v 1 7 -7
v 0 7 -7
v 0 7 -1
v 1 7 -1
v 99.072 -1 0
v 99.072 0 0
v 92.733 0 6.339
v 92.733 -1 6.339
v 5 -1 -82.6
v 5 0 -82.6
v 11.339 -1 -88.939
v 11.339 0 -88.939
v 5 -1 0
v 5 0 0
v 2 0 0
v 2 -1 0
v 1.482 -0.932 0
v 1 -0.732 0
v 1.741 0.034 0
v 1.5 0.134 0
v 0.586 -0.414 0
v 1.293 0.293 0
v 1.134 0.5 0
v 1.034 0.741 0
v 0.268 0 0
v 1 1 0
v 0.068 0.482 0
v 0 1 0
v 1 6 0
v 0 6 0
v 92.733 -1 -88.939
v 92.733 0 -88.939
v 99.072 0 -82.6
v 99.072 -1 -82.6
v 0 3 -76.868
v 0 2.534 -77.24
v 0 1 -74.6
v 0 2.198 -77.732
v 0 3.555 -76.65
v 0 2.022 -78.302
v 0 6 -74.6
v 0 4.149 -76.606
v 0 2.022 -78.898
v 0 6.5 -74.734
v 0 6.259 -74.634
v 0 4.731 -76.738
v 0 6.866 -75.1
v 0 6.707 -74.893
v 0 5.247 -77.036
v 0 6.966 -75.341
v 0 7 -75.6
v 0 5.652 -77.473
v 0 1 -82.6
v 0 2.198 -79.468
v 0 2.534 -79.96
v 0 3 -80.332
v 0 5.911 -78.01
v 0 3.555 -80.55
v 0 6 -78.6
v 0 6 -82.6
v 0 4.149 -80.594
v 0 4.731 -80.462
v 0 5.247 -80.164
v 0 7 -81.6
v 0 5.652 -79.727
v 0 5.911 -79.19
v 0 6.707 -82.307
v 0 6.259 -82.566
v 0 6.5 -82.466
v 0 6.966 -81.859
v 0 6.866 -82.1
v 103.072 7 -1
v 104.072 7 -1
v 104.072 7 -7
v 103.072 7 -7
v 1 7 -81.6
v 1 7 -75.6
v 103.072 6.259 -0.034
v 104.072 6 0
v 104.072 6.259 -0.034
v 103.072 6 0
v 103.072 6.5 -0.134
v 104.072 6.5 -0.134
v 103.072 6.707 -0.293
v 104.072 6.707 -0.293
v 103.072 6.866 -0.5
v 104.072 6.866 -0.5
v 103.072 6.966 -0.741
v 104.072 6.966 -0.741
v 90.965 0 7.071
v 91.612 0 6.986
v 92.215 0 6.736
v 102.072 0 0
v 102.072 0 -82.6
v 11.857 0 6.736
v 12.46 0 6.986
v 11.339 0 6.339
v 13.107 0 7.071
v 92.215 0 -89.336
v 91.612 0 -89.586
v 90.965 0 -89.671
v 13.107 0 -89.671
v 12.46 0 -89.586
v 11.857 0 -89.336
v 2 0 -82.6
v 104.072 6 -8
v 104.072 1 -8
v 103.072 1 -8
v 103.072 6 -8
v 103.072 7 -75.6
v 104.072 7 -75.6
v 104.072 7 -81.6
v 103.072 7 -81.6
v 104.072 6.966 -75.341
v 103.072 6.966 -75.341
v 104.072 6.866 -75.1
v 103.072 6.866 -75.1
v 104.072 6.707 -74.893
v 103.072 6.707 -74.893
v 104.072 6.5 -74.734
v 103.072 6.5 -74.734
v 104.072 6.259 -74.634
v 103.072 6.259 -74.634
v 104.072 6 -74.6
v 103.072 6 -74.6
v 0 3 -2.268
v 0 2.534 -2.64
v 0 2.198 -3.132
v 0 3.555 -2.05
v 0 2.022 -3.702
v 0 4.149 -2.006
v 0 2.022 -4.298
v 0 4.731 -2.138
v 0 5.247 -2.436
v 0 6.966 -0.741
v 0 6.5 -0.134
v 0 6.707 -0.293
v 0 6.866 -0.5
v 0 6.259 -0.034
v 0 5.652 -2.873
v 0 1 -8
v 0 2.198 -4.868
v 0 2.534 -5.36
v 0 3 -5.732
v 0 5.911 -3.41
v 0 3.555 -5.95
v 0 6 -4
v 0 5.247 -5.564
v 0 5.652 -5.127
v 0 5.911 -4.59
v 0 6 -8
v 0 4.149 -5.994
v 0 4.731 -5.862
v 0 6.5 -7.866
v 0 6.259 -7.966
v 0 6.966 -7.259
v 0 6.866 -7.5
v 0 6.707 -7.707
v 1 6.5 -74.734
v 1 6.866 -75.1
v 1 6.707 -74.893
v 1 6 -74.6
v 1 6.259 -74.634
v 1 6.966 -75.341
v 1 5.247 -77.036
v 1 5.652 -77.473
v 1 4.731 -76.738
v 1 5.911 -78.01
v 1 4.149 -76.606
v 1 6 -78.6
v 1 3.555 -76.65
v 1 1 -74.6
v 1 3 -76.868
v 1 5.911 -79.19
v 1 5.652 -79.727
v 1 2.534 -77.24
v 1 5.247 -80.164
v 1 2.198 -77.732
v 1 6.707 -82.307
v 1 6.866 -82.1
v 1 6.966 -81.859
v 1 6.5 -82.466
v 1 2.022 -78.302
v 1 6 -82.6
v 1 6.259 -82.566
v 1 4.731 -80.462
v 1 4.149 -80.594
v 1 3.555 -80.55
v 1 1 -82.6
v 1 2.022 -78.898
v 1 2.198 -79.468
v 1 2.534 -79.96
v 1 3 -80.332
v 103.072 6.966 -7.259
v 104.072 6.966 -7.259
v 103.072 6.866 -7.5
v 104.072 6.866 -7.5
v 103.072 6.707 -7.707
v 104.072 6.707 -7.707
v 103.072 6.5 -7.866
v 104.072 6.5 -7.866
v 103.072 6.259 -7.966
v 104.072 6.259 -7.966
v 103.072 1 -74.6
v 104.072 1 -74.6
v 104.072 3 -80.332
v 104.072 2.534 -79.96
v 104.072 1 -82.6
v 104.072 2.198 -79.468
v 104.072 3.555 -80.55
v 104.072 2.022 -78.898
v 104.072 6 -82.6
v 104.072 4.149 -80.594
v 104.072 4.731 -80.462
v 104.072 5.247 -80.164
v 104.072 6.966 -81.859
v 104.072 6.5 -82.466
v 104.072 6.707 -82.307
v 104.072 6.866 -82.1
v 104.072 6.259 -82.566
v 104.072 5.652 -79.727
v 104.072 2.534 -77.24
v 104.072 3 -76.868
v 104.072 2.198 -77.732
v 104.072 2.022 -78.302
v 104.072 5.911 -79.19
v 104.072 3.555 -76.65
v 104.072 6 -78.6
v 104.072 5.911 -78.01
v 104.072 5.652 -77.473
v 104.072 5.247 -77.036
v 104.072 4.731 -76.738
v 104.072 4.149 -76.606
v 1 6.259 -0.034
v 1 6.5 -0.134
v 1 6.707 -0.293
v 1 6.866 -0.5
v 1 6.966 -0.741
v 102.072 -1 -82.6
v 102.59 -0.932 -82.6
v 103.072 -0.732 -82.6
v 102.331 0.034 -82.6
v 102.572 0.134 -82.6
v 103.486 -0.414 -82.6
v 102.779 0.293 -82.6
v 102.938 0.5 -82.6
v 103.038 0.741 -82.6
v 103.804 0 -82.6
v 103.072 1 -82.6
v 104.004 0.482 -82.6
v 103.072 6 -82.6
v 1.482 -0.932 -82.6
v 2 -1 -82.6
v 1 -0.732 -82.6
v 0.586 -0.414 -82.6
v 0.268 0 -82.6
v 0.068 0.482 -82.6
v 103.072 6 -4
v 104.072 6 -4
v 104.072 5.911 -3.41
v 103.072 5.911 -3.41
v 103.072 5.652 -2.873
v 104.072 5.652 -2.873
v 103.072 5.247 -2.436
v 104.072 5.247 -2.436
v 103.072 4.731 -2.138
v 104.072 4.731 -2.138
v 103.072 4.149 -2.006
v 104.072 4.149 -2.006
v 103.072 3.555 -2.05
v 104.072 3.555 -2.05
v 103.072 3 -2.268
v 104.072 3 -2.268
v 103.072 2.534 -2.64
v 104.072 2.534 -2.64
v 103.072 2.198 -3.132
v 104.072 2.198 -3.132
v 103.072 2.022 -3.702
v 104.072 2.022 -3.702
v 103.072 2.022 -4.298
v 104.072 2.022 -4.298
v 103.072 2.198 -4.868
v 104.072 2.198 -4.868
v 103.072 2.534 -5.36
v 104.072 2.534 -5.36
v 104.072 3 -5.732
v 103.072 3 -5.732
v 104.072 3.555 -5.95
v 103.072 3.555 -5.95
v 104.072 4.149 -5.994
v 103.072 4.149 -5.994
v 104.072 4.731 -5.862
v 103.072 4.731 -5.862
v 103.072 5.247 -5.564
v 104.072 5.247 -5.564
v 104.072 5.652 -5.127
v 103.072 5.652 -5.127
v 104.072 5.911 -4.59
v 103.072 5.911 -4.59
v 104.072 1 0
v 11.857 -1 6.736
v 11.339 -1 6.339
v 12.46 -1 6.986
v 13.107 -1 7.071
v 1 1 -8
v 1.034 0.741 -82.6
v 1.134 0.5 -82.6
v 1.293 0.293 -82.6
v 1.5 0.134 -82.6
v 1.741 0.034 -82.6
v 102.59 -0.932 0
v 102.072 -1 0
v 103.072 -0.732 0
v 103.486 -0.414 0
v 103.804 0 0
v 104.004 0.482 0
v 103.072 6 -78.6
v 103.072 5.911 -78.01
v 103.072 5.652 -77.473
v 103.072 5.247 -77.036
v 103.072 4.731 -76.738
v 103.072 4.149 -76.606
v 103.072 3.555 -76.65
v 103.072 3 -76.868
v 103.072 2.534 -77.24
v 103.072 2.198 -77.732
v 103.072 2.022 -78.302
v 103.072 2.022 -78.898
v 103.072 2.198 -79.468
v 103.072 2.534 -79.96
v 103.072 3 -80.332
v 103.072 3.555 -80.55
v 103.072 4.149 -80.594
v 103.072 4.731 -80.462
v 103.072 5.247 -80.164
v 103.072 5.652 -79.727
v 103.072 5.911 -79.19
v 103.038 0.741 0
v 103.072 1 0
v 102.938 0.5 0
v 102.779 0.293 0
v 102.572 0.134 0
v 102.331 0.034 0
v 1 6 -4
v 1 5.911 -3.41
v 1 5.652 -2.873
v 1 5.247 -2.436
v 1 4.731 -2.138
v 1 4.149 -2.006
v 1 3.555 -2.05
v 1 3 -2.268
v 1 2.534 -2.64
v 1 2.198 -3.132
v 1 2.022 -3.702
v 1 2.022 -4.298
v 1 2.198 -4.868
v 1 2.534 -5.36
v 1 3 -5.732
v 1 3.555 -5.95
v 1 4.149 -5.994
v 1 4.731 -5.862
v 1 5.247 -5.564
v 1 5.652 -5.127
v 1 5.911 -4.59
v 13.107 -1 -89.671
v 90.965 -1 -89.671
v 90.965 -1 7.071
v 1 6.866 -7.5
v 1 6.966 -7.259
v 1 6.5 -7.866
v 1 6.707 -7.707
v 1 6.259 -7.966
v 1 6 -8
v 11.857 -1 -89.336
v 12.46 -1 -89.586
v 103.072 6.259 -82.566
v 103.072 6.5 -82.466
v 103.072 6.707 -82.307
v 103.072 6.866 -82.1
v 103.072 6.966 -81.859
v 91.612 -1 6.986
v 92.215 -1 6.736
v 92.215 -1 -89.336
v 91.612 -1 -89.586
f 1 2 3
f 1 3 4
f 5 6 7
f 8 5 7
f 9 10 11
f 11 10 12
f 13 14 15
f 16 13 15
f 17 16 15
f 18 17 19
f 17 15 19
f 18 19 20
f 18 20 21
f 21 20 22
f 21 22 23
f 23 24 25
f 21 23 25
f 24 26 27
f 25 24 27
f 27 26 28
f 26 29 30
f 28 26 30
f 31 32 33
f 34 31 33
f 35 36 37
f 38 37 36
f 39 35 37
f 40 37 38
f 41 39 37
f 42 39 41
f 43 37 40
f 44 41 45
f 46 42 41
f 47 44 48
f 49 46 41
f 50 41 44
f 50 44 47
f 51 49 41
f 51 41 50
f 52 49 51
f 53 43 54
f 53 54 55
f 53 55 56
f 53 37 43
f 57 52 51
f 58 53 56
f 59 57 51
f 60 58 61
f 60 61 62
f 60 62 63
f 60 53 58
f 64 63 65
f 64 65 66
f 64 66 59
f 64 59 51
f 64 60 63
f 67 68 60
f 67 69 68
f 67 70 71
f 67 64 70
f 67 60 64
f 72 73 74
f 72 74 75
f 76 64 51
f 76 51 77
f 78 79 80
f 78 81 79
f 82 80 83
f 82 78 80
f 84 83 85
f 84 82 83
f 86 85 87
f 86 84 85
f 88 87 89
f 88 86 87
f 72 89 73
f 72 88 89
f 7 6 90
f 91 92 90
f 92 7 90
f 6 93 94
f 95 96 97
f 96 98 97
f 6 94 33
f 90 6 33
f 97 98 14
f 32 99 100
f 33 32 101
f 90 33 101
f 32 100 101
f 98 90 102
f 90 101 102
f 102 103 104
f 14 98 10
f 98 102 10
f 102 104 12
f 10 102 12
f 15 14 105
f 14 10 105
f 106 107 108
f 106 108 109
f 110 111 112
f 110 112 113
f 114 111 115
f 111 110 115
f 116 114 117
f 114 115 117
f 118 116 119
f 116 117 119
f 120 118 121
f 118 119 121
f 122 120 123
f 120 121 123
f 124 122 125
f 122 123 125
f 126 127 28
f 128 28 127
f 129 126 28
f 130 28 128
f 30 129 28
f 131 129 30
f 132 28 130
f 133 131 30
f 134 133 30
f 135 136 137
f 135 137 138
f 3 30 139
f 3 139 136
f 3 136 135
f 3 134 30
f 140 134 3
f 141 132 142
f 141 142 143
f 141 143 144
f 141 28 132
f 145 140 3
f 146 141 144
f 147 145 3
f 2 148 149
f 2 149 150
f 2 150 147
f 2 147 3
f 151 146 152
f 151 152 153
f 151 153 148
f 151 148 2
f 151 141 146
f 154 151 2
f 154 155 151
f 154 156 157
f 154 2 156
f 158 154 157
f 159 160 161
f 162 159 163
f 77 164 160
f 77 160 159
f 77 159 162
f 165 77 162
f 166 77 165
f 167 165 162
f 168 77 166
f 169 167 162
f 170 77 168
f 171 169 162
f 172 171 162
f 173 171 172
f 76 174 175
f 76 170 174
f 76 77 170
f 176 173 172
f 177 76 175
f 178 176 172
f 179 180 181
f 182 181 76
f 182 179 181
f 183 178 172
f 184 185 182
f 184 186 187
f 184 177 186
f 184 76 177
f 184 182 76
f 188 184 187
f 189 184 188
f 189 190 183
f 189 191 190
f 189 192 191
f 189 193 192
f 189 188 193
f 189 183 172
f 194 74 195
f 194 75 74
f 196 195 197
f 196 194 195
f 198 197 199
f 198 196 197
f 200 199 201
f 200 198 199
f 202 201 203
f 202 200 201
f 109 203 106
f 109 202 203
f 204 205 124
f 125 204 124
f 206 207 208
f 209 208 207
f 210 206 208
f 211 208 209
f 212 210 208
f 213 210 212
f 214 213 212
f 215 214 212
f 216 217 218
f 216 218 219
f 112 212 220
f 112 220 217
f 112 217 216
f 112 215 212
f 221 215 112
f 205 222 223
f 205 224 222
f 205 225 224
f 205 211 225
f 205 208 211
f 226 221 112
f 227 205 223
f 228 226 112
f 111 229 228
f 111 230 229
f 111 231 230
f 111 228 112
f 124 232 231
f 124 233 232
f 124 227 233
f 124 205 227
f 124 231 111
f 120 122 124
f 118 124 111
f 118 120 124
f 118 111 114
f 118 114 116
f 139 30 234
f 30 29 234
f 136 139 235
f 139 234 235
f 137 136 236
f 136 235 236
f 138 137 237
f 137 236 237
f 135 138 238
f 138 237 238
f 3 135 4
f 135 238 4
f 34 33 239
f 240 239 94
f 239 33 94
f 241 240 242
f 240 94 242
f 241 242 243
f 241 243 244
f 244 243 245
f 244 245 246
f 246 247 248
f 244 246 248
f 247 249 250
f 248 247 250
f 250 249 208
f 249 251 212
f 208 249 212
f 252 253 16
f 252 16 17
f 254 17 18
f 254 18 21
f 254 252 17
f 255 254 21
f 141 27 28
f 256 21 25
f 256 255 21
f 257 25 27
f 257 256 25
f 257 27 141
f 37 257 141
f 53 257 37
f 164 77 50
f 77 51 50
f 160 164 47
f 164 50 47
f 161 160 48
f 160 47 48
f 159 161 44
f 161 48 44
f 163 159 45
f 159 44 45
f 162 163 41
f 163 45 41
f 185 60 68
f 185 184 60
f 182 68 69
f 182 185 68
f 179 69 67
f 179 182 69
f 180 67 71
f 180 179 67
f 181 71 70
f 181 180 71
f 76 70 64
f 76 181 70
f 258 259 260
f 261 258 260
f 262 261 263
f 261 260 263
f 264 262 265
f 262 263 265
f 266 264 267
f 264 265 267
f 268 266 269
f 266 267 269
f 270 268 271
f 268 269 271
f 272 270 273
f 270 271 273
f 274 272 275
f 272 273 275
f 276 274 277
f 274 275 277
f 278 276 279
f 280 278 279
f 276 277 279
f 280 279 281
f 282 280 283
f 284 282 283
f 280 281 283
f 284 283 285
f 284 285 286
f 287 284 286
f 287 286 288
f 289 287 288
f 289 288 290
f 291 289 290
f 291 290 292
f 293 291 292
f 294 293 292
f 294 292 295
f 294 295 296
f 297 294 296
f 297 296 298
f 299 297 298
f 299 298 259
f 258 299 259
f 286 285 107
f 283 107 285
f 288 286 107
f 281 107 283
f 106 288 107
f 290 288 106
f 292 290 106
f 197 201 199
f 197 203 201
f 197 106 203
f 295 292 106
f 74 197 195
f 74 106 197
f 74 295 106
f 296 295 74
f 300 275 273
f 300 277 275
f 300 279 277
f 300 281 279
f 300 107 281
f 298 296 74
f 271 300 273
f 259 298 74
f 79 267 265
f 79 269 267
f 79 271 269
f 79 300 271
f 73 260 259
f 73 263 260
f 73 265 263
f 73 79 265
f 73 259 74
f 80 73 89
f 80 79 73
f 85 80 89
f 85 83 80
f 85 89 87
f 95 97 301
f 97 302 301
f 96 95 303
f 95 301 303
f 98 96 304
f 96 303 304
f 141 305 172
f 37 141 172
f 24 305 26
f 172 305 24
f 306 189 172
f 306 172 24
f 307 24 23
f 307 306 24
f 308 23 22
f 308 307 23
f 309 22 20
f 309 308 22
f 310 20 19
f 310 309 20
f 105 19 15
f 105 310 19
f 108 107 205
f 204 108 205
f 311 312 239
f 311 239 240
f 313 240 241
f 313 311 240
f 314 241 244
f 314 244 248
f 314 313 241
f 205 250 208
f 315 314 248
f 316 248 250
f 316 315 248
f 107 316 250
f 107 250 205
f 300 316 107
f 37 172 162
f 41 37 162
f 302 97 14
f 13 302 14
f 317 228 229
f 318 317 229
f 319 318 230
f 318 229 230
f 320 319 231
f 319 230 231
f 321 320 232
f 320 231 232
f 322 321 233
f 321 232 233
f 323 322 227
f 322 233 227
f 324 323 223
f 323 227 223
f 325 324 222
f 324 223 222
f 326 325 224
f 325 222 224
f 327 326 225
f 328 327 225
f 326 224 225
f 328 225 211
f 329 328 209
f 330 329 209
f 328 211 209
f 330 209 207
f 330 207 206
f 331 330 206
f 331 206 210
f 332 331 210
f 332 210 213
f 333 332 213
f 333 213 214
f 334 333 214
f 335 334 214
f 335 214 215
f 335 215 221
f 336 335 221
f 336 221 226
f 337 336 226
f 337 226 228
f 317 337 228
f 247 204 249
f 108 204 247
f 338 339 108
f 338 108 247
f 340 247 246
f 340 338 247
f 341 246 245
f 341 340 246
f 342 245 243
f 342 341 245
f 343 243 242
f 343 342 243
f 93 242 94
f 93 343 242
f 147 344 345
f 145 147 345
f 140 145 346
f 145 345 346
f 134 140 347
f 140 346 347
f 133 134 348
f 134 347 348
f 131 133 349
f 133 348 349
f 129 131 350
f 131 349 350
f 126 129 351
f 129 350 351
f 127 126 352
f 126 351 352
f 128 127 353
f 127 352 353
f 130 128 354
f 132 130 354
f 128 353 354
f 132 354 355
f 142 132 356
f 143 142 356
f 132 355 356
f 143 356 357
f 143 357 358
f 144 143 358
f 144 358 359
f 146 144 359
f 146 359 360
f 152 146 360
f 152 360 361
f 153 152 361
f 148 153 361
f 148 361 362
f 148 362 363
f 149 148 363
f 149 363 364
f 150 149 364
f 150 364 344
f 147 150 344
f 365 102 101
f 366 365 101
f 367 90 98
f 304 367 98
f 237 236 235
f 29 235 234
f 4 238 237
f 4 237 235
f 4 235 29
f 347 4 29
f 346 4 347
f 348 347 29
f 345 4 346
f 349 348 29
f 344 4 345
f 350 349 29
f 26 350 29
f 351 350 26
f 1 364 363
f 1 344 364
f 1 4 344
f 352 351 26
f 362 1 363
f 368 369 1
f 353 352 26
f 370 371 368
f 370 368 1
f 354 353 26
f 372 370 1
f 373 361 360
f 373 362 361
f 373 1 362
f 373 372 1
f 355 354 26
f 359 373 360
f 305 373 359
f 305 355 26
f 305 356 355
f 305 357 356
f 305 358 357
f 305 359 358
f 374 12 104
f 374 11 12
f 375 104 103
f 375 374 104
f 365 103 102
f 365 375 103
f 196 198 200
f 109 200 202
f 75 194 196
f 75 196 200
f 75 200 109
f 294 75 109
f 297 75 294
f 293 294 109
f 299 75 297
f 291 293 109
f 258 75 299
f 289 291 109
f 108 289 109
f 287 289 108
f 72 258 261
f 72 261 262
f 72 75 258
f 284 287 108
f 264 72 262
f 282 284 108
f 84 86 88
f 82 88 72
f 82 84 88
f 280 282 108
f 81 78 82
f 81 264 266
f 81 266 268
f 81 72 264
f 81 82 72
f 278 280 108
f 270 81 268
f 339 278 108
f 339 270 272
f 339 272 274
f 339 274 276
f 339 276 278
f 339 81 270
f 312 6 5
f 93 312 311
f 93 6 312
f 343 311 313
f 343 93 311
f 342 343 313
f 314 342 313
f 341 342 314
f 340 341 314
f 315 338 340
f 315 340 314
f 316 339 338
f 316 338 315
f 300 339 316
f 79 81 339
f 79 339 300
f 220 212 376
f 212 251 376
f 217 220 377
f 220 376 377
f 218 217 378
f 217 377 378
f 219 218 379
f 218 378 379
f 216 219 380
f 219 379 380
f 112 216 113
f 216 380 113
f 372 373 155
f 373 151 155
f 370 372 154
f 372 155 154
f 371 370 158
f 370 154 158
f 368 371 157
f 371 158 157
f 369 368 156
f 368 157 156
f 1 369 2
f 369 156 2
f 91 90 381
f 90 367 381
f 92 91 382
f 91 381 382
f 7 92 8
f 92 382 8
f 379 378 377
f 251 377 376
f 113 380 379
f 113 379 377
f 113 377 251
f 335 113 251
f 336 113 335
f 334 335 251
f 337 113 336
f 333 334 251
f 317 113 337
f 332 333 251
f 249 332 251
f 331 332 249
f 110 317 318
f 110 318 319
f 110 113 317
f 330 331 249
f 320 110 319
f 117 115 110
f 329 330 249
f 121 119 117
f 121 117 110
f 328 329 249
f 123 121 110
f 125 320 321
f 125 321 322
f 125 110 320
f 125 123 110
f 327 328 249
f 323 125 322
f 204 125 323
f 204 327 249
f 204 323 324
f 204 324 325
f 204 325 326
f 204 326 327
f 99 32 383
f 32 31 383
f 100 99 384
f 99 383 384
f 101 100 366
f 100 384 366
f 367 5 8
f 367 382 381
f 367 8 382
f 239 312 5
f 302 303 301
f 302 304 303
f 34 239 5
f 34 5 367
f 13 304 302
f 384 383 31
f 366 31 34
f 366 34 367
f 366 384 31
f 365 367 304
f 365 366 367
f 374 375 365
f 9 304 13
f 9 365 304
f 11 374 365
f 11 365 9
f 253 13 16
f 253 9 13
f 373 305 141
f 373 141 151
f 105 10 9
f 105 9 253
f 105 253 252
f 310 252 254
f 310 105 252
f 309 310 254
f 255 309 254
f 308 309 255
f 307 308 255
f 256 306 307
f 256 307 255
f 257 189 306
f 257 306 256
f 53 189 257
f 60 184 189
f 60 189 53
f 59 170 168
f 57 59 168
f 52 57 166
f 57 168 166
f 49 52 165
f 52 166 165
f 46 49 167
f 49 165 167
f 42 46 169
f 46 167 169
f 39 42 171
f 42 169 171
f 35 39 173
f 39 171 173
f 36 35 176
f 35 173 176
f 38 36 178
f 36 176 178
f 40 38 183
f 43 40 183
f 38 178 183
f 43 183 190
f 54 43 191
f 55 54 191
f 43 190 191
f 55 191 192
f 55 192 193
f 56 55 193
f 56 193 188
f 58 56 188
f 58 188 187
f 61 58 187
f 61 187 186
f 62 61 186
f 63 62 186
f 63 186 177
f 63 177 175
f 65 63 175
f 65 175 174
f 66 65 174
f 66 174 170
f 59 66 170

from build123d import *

# Parameters (mm, degrees)
BASE_FLANGE2_DEPTH             = 1
EDGE_FLANGE1_STRIP_W           = 6
EDGE_FLANGE1_STRIP_H           = 1
EDGE_FLANGE1_STRIP_CUT_DEPTH   = 82.6
EDGE_FLANGE1_STRIP_2_W         = 6
EDGE_FLANGE1_STRIP_2_H         = 1
EDGE_FLANGE1_STRIP_CUT_2_DEPTH = 82.6
EDGE_FLANGE1_DEPTH             = 82.6
EDGE_FLANGE1_BEND_DEPTH        = 82.6
SKETCH16_W                     = 66.6
SKETCH16_H                     = 7
CUT_EXTRUDE1_DEPTH             = 138.553195479
FILLET1_R                      = 1
SKETCH17_R                     = 2
CUT_EXTRUDE2_DEPTH             = 138.553195479
FILLET2_R                      = 2.5


# Sheet-metal steps are written as plain solids
with BuildPart() as part:
    # Sketch1 → Base-Flange2 (new body)
    with BuildSketch(Plane(origin=(0, 0, 0), x_dir=(1, 0, 0), z_dir=(0, 1, 0))):
        Polygon((0, 0), (0, 82.6), (5, 82.6), (12.071067812, 89.671067812), (92.000932188, 89.671067812), (99.072, 82.6), (104.072, 82.6), (104.072, 0), (99.072, 0), (92.000932188, -7.071067812), (12.071067812, -7.071067812), (5, 0), align=None)
    extrude(amount=-BASE_FLANGE2_DEPTH)

    # Edge-Flange1 strip (across the edge) → Edge-Flange1 strip cut (cut)
    with BuildSketch(Plane(origin=(104.072, 0, 0), x_dir=(-1, 0, 0), z_dir=(0, 0, -1))):
        with Locations((-1, -0.5)):
            Rectangle(EDGE_FLANGE1_STRIP_W, EDGE_FLANGE1_STRIP_H)
    extrude(amount=EDGE_FLANGE1_STRIP_CUT_DEPTH, mode=Mode.SUBTRACT)

    # Edge-Flange1 strip 2 (across the edge) → Edge-Flange1 strip cut 2 (cut)
    with BuildSketch(Plane.XY.offset(-82.6)):
        with Locations((-1, -0.5)):
            Rectangle(EDGE_FLANGE1_STRIP_2_W, EDGE_FLANGE1_STRIP_2_H)
    extrude(amount=EDGE_FLANGE1_STRIP_CUT_2_DEPTH, mode=Mode.SUBTRACT)

    # Edge-Flange1 section (across the edge) → Edge-Flange1 (add)
    with BuildSketch(Plane(origin=(104.072, 0, 0), x_dir=(-1, 0, 0), z_dir=(0, 0, -1))):
        with BuildLine():
            Line((0, 1), (0, 7))
            Line((0, 7), (1, 7))
            Line((1, 7), (1, 1))
            ThreePointArc((1, 1), (1.292893219, 0.292893219), (2, 0))
            Line((2, 0), (2, -1))
            ThreePointArc((2, -1), (0.585786438, -0.414213562), (0, 1))
        make_face()
    extrude(amount=EDGE_FLANGE1_DEPTH)

    # Edge-Flange1 section 2 (across the edge) → Edge-Flange1 bend (add)
    with BuildSketch(Plane.XY.offset(-82.6)):
        with BuildLine():
            Line((0, 1), (0, 7))
            Line((0, 7), (1, 7))
            Line((1, 7), (1, 1))
            ThreePointArc((1, 1), (1.292893219, 0.292893219), (2, 0))
            Line((2, 0), (2, -1))
            ThreePointArc((2, -1), (0.585786438, -0.414213562), (0, 1))
        make_face()
    extrude(amount=EDGE_FLANGE1_BEND_DEPTH)

    # Sketch16 → Cut-Extrude1 (cut, through all)
    with BuildSketch(Plane(origin=(104.072, 0, 0), x_dir=(0, 0, -1), z_dir=(1, 0, 0))):
        with Locations((41.3, 4.5)):
            Rectangle(SKETCH16_W, SKETCH16_H)
    extrude(amount=-CUT_EXTRUDE1_DEPTH, mode=Mode.SUBTRACT)

    # Fillet1
    fillet1_edges = [part.edges().sort_by_distance(p)[0] for p in [
        (0.5, 7, -74.6),
        (0.5, 7, -8),
        (103.572, 7, -8),
        (103.572, 7, -74.6),
        (103.572, 7, 0),
        (103.572, 7, -82.6),
        (0.5, 7, -82.6),
        (0.5, 7, 0),
    ]]
    fillet(fillet1_edges, radius=FILLET1_R)

    # Sketch17 → Cut-Extrude2 (cut, through all)
    with BuildSketch(Plane(origin=(104.072, 0, 0), x_dir=(0, 0, -1), z_dir=(1, 0, 0))):
        with Locations(Location((4, 4, 0), (0, 0, 90))):
            Circle(SKETCH17_R)
        with Locations(Location((78.6, 4, 0), (0, 0, 90))):
            Circle(SKETCH17_R)
    extrude(amount=-CUT_EXTRUDE2_DEPTH, mode=Mode.SUBTRACT)

    # Fillet2
    fillet2_edges = [part.edges().sort_by_distance(p)[0] for p in [
        (12.071067812, -0.5, -89.671067812),
        (92.000932188, -0.5, -89.671067812),
        (92.000932188, -0.5, 7.071067812),
        (12.071067812, -0.5, 7.071067812),
    ]]
    fillet(fillet2_edges, radius=FILLET2_R)


solid = part.part
